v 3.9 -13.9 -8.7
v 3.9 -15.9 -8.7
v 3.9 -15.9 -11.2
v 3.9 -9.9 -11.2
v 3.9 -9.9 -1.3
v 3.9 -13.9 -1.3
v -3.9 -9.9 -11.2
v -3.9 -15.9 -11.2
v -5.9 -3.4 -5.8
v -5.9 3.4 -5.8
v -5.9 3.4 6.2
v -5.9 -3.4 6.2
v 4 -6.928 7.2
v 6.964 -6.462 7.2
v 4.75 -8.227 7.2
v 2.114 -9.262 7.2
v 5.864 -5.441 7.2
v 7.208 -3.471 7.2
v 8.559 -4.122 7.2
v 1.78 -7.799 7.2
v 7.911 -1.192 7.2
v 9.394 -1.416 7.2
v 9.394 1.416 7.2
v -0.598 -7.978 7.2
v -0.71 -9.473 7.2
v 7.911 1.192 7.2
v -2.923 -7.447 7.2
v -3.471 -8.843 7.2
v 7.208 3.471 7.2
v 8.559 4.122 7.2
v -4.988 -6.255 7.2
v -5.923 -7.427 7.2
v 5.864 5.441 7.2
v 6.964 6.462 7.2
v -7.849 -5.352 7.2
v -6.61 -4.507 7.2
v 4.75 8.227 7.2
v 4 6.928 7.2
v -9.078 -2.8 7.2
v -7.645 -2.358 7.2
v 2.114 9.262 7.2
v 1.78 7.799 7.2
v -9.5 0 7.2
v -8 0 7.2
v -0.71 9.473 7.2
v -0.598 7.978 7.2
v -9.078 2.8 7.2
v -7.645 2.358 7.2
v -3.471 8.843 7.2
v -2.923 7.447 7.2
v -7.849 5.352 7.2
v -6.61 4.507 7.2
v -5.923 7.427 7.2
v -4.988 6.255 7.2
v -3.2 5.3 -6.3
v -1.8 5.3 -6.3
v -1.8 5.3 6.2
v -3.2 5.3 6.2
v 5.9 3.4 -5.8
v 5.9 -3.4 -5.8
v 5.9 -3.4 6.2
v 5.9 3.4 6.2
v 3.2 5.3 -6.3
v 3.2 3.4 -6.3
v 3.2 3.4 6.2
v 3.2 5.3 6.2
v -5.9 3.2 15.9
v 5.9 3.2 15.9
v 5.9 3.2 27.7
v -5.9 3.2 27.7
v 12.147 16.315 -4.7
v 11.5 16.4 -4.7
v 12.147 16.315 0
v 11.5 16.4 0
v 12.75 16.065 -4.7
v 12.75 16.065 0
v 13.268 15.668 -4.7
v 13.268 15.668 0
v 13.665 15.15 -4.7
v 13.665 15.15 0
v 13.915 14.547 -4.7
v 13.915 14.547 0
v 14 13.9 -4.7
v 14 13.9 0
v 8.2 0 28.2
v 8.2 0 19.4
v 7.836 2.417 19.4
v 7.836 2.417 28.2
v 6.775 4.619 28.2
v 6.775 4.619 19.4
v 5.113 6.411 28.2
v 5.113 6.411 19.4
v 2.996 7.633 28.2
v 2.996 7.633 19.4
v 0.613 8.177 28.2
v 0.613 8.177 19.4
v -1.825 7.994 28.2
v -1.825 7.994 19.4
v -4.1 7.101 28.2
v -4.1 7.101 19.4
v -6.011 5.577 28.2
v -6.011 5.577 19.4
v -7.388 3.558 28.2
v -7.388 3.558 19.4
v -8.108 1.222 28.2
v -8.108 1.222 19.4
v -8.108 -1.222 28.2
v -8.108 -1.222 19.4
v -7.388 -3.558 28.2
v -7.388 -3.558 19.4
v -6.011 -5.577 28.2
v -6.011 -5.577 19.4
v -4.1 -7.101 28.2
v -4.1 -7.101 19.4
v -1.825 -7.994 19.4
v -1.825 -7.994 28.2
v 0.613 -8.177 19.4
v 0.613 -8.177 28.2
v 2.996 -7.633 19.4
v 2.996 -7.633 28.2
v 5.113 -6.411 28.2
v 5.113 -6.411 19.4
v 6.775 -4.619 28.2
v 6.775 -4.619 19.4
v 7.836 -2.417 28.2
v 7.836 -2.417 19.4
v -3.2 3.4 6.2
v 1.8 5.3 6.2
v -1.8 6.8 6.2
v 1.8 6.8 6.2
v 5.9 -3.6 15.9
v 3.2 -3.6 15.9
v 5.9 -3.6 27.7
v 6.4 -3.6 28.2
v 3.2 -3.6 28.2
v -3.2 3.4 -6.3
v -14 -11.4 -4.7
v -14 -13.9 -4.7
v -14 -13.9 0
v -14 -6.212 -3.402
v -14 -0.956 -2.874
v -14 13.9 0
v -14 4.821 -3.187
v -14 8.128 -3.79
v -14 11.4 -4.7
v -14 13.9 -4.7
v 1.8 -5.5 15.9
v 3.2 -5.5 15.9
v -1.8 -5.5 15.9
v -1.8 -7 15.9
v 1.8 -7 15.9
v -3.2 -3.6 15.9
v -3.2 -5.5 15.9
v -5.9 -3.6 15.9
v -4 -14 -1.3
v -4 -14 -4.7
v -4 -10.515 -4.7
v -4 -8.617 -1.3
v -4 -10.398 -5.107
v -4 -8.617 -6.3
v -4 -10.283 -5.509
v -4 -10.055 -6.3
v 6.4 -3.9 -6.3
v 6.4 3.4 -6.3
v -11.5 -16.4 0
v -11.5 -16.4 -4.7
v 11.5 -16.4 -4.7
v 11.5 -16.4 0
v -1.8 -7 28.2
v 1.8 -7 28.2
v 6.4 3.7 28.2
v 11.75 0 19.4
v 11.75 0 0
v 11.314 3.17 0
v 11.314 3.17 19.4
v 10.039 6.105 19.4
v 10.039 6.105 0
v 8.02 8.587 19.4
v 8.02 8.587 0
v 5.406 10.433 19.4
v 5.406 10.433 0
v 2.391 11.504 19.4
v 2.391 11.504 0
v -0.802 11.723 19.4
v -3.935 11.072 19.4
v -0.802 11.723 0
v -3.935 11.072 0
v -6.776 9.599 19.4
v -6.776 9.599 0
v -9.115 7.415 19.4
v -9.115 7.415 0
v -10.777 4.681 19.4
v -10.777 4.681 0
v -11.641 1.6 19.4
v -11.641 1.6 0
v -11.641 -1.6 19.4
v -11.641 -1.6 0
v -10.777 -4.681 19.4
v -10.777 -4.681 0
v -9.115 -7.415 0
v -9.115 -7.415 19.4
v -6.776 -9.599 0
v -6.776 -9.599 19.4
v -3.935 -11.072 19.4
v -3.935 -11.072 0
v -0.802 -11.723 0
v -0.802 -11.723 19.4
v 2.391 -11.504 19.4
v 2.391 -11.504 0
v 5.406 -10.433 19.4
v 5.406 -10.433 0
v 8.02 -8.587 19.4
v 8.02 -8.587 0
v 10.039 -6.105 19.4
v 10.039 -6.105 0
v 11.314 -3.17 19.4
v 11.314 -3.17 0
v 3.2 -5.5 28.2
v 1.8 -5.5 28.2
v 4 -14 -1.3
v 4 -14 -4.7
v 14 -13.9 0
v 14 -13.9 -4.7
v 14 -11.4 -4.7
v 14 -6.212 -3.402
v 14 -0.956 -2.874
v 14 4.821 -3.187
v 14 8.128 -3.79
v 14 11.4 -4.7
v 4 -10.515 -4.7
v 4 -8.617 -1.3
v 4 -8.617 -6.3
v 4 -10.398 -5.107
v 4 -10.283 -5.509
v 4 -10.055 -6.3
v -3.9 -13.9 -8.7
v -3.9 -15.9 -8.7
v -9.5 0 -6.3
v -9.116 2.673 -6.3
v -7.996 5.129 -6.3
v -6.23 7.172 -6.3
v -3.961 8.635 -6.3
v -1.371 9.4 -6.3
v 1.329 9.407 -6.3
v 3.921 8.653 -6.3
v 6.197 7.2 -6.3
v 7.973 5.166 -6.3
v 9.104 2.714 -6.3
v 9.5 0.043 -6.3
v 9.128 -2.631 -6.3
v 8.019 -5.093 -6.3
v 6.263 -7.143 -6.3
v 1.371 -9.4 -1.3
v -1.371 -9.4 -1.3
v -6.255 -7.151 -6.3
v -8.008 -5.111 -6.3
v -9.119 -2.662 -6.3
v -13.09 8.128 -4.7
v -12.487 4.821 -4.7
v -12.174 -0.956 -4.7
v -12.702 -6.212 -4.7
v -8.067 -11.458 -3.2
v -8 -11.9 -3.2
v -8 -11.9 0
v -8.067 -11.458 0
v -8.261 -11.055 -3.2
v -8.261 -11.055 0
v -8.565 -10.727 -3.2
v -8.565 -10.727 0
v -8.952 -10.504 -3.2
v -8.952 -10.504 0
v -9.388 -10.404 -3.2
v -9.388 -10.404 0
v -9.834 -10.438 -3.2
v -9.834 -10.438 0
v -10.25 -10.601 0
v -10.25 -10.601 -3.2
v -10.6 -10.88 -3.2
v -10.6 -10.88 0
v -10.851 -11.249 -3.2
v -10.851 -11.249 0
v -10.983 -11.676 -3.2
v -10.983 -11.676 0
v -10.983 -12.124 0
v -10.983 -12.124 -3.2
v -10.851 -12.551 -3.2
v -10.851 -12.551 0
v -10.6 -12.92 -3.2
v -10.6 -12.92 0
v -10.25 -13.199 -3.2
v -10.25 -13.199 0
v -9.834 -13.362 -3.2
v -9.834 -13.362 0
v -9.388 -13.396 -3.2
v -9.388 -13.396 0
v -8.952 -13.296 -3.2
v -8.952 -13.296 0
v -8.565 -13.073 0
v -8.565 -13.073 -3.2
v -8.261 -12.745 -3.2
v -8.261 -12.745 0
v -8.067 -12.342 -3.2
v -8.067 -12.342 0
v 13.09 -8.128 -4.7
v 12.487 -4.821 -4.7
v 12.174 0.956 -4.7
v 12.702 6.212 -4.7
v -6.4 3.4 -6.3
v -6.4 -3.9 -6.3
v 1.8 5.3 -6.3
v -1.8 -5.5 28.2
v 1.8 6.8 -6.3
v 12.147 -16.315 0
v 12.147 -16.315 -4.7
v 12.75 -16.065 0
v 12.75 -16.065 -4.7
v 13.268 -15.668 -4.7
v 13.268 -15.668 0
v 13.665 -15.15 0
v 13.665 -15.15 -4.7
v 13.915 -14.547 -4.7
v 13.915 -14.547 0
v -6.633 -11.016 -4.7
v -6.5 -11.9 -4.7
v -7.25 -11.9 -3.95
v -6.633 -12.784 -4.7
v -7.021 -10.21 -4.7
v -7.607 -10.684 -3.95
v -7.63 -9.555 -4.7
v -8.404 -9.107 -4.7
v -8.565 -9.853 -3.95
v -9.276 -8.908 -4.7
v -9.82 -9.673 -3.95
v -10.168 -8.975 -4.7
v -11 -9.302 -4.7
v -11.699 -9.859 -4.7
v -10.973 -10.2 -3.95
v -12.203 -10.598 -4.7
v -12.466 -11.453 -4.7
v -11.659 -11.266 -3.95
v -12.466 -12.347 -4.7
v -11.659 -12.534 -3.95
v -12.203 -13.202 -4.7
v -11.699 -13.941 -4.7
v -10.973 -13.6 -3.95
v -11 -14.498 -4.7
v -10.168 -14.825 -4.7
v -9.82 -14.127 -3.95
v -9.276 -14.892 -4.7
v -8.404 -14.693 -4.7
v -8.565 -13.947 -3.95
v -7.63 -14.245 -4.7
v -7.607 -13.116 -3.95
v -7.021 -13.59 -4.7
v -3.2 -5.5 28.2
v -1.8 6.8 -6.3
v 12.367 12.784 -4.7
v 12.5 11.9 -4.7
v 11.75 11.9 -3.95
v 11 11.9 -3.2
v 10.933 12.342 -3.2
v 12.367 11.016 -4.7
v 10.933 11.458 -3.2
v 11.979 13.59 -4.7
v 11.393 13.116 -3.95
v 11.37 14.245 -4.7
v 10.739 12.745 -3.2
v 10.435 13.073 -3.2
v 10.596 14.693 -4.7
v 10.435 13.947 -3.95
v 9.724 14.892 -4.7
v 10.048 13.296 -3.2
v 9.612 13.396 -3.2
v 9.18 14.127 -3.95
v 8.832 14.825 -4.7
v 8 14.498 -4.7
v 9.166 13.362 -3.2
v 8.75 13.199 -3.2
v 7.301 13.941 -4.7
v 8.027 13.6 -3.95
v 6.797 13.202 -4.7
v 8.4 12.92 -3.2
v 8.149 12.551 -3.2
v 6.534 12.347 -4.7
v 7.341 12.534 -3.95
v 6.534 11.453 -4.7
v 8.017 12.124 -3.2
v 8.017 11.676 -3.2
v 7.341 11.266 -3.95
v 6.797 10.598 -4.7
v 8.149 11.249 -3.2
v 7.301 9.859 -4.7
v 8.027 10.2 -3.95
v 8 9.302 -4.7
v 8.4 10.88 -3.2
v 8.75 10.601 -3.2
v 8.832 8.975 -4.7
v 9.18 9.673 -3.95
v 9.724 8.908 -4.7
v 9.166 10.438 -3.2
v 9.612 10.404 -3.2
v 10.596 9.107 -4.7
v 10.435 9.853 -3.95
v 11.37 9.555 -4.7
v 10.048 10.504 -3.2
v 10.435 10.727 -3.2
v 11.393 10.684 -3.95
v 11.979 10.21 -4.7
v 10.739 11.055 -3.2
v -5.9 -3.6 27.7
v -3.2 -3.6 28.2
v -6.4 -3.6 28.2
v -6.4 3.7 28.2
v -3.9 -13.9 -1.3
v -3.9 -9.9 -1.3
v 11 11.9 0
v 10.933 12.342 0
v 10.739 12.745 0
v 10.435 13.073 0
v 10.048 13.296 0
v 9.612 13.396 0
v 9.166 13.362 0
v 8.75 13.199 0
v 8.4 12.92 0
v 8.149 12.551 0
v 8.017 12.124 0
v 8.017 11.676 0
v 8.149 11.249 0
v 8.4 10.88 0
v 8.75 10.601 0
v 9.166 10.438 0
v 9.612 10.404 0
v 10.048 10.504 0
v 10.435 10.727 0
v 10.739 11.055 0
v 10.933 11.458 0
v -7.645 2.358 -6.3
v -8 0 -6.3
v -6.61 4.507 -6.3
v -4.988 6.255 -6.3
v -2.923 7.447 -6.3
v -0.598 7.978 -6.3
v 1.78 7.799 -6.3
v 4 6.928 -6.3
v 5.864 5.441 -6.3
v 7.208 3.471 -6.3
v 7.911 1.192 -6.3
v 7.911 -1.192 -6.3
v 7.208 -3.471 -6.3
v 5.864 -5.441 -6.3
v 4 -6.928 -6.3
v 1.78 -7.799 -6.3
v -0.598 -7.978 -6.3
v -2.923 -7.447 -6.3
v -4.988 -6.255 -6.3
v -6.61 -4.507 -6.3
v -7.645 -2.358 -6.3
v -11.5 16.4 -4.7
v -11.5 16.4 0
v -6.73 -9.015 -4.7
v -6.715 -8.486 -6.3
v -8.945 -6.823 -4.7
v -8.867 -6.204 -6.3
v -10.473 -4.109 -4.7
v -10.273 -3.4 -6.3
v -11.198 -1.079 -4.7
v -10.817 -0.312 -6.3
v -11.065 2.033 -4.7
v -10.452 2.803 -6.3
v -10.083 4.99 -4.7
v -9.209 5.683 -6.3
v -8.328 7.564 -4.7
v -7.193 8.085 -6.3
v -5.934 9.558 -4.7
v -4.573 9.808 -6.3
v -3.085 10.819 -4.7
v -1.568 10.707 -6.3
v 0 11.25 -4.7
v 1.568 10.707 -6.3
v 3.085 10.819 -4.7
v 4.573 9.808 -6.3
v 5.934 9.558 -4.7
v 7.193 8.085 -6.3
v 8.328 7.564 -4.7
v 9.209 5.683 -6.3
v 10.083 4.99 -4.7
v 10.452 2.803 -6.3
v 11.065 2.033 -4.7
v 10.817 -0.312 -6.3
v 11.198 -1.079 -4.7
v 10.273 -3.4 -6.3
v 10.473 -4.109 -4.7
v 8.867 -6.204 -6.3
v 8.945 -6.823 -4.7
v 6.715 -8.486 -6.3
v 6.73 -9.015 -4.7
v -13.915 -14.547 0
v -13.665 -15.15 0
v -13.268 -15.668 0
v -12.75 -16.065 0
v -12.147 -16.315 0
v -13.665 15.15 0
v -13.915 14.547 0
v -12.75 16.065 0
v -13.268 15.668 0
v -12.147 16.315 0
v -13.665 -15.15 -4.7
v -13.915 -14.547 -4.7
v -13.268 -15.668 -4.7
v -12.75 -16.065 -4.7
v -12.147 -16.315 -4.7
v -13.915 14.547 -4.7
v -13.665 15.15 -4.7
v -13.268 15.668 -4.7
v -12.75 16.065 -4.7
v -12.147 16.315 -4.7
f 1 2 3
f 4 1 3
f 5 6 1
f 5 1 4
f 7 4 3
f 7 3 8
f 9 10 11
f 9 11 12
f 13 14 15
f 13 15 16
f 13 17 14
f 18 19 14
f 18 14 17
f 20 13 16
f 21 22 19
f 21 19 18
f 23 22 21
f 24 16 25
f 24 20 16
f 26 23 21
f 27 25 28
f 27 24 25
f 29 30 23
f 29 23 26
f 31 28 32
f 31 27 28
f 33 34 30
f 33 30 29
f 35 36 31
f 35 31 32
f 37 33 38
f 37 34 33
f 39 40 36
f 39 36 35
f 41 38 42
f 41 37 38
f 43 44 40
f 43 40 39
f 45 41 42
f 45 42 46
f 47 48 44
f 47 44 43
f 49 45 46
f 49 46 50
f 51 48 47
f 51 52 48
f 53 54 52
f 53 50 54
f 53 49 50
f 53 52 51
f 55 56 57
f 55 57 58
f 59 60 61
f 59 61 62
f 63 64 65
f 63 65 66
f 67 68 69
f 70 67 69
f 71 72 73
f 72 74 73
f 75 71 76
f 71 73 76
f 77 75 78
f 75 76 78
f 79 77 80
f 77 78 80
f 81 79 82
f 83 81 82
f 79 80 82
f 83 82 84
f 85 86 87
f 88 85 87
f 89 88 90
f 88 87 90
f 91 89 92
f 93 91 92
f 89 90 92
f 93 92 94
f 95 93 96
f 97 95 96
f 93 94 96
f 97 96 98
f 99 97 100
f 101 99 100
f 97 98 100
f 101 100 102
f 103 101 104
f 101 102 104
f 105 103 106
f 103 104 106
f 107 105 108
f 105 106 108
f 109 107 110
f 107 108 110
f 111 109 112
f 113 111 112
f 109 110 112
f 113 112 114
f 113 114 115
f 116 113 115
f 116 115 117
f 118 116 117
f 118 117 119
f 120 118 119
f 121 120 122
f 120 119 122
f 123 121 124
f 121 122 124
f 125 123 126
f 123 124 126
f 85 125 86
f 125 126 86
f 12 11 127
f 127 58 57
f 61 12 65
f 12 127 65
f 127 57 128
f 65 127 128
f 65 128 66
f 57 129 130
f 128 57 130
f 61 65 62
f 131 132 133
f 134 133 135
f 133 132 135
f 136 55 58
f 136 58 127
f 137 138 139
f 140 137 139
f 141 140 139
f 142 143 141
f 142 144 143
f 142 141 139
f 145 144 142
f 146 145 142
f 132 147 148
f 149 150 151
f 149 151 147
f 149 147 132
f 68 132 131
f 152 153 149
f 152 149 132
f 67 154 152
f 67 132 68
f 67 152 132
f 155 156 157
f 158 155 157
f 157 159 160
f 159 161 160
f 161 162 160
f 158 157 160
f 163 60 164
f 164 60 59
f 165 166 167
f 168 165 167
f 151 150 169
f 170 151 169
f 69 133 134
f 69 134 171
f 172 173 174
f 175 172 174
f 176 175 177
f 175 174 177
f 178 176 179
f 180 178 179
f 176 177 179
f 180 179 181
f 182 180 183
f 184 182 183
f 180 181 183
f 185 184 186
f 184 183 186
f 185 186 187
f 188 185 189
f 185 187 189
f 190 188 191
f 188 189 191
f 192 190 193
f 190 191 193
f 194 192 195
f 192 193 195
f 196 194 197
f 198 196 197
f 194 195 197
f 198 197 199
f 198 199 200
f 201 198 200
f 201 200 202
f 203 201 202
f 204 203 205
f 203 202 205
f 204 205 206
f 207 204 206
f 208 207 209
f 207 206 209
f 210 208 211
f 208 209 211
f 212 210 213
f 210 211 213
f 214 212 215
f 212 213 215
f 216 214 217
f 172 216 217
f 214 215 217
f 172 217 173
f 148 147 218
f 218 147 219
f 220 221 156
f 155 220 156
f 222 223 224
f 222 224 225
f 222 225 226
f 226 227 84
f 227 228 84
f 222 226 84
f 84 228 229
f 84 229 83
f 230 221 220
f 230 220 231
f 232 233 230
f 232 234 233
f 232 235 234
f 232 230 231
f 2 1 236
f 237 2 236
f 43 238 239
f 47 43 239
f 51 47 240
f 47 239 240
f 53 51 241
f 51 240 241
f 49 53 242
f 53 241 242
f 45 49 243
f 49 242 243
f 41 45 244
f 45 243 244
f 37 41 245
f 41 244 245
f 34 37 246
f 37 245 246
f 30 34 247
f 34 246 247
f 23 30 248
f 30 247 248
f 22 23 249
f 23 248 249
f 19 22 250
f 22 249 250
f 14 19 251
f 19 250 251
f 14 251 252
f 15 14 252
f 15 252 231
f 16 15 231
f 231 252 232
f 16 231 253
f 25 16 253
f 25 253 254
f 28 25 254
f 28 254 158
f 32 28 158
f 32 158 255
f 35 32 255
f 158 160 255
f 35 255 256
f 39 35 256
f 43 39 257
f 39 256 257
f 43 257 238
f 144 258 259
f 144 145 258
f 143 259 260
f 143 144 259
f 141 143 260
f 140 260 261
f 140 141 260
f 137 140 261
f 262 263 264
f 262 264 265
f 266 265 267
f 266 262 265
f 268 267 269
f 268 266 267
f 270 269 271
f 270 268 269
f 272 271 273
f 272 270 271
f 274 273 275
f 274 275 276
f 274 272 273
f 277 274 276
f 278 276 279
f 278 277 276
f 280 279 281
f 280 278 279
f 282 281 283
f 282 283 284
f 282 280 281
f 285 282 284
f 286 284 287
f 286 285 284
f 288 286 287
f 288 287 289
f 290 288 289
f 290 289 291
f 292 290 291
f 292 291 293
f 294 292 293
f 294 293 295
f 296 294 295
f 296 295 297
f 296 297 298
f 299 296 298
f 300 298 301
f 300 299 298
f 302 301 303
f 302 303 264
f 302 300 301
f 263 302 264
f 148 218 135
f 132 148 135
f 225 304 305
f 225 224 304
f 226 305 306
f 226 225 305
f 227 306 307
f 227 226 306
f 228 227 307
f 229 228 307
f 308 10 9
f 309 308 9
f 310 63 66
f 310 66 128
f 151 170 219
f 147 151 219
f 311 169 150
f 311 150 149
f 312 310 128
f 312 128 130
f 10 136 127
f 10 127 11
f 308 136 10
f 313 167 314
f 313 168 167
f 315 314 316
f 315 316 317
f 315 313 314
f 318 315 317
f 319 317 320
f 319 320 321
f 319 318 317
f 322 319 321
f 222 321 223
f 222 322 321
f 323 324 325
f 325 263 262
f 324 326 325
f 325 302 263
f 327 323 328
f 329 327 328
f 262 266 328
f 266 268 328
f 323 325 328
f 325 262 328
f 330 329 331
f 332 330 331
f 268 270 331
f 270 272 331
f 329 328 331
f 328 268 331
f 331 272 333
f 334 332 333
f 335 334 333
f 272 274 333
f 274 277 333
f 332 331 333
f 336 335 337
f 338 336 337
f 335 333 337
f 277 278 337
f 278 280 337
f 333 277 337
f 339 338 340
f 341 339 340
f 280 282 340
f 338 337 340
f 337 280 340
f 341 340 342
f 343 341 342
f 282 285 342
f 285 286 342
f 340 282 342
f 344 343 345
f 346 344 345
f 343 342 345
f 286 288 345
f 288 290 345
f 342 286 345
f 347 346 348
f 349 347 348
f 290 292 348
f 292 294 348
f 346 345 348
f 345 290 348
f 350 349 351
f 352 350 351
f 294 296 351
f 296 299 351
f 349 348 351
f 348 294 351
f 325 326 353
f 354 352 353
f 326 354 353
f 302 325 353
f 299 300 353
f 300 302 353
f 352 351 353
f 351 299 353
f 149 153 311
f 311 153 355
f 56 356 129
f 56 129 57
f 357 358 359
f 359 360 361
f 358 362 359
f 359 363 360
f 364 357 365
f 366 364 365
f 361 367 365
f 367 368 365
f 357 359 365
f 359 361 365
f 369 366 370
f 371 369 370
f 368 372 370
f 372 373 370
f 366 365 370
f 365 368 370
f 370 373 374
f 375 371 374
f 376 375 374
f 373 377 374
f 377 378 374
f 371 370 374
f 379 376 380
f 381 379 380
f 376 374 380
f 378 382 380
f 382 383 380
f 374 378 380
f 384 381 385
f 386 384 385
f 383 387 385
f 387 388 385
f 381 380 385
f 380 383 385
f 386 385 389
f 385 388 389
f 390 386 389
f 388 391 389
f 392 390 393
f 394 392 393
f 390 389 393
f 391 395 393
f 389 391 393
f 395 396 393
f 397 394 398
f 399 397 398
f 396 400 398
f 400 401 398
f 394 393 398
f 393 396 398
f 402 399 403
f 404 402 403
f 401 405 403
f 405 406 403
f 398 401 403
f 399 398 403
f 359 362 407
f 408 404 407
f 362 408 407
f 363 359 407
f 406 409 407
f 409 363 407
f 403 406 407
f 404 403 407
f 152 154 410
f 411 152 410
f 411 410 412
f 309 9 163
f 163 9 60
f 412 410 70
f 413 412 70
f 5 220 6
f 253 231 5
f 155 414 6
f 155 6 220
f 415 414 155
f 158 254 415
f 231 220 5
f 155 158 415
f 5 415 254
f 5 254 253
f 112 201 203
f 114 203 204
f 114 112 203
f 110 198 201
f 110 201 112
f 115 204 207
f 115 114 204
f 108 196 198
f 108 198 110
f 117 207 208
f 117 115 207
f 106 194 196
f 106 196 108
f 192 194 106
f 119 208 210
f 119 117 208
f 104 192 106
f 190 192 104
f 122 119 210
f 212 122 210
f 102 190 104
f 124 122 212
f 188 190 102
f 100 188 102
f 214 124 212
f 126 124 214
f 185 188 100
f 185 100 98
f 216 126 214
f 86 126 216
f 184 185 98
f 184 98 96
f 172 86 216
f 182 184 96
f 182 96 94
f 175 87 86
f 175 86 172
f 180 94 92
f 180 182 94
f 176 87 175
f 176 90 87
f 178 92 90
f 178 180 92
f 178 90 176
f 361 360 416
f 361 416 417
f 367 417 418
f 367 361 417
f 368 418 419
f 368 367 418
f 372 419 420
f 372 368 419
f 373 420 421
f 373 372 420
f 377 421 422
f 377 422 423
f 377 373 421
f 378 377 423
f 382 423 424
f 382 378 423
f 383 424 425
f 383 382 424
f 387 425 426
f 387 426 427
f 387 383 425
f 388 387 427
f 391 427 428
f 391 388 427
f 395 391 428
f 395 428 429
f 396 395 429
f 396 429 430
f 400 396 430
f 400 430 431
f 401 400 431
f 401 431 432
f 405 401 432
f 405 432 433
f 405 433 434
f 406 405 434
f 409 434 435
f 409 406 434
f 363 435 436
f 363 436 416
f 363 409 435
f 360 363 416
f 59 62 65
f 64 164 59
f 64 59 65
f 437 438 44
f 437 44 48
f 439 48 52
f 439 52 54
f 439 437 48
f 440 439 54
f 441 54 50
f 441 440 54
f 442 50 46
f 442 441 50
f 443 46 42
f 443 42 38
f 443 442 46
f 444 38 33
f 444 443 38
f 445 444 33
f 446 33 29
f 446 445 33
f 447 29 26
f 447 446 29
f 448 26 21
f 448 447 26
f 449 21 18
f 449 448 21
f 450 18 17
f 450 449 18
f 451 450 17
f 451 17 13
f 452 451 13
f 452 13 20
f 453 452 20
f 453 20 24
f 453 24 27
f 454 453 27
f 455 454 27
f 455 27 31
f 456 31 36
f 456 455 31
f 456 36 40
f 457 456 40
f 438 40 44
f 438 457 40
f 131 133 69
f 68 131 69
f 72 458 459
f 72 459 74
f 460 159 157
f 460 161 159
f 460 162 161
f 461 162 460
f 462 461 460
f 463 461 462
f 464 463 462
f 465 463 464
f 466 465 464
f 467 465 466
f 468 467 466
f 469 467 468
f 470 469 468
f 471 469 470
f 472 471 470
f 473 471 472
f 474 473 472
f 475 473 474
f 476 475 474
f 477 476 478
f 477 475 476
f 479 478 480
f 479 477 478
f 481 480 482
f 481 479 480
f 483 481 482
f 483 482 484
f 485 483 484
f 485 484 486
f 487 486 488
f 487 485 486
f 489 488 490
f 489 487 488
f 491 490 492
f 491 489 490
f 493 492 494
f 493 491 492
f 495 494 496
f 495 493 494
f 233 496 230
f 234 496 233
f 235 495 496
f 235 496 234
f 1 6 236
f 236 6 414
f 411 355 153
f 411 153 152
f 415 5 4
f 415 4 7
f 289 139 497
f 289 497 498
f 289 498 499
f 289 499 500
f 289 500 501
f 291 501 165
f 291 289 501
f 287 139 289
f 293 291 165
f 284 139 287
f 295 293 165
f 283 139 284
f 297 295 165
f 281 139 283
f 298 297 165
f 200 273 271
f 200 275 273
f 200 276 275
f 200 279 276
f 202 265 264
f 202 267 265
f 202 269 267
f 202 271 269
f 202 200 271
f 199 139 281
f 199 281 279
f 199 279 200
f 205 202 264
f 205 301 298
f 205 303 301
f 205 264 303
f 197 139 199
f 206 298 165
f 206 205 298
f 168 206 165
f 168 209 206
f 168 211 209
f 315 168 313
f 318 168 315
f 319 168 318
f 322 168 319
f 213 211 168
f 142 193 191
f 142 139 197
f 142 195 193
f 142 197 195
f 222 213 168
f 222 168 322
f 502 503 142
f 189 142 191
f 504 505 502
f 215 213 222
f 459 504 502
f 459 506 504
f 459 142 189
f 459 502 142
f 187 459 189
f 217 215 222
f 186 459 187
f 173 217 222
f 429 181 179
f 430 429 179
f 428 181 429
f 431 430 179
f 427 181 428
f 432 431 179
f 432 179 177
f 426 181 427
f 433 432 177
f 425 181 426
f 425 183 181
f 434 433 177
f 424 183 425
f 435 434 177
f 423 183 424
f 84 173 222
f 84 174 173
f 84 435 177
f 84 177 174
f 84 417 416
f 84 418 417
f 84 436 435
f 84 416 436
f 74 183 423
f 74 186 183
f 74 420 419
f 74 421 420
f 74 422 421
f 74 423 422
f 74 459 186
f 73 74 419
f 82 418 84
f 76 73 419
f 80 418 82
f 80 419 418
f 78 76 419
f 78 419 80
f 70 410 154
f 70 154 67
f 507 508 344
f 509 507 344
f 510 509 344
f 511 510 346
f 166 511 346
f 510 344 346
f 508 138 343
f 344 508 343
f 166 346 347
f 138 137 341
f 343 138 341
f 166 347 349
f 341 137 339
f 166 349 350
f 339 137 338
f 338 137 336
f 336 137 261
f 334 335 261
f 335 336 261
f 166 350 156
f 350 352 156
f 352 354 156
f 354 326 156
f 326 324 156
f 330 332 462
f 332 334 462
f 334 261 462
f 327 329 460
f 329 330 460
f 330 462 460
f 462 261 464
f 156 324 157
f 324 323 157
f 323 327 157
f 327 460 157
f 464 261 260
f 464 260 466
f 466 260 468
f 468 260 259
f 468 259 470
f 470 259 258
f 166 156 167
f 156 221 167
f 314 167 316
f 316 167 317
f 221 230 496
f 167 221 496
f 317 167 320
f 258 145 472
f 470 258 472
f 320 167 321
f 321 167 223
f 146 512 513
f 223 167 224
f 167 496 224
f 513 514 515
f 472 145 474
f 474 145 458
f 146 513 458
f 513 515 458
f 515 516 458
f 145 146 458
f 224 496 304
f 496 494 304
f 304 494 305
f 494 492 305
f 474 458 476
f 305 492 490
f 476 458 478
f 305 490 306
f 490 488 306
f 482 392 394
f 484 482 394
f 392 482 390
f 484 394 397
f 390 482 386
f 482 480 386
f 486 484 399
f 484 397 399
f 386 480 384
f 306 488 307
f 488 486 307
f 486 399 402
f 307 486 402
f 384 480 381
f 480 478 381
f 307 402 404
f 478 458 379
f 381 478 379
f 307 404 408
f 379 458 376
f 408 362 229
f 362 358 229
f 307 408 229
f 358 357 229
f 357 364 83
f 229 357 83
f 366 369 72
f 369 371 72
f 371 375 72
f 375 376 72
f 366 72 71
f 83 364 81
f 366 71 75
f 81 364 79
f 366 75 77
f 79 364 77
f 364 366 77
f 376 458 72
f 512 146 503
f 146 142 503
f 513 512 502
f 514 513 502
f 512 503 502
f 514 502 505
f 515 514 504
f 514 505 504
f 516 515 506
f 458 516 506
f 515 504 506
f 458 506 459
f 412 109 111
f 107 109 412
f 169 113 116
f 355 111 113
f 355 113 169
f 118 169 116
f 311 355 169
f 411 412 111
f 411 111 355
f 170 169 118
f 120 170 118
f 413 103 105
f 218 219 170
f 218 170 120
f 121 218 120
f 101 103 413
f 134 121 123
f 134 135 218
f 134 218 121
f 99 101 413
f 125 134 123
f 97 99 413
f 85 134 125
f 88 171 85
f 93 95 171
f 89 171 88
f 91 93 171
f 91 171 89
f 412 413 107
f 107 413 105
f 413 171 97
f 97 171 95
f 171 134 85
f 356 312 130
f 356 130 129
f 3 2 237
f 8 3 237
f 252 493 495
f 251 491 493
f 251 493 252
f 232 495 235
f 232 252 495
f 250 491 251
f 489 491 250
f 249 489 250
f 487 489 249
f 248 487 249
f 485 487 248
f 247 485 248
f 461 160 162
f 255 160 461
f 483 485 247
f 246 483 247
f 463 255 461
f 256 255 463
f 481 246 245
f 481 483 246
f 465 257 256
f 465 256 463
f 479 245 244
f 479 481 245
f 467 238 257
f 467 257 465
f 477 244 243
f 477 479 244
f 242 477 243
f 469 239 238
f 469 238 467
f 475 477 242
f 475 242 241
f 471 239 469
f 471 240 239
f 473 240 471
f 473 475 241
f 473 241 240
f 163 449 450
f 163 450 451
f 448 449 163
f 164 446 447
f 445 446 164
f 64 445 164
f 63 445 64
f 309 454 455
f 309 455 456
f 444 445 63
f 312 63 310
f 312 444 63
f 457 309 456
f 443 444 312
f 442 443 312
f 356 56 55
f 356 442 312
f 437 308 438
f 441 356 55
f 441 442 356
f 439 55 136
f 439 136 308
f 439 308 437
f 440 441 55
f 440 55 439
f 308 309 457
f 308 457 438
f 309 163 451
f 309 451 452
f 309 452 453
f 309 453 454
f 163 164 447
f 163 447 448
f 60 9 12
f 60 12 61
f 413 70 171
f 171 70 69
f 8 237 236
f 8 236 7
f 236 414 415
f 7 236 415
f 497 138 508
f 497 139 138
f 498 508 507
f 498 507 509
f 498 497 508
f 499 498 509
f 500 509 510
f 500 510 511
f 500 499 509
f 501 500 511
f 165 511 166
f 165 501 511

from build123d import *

# Parameters (mm, degrees)
ESQUISSE1_R                   = 11.75
BOSS_EXTRU_1_DEPTH            = 19.4
ESQUISSE2_R                   = 8.2
BOSS_EXTRU_2_DEPTH            = 8.8
ENL_V_START                   = -5.9
ENL_V_MAT_EXTRU_1_OUTLINE_W   = 6.8
ENL_V_MAT_EXTRU_1_OUTLINE_H   = 12.3
ENL_V_MAT_EXTRU_1_DEPTH       = 11.8
ENL_V_START_2                 = -1.8
ENL_V_MAT_EXTRU_1_2_OUTLINE_W = 3.4
ENL_V_MAT_EXTRU_1_2_OUTLINE_H = 12.3
ENL_V_MAT_EXTRU_1_2_DEPTH     = 3.6
ENL_V_START_3                 = -3.2
ENL_V_MAT_EXTRU_1_3_OUTLINE_W = 1.9
ENL_V_MAT_EXTRU_1_3_OUTLINE_H = 12.3
ENL_V_MAT_EXTRU_1_3_DEPTH     = 6.4
BOSS_EXTRU_3_START            = -4.7
BOSS_EXTRU_3_OUTLINE_W        = 28
BOSS_EXTRU_3_OUTLINE_H        = 32.8
BOSS_EXTRU_3_OUTLINE_R        = 1.5
BOSS_EXTRU_3_DEPTH            = 4.7
ESQUISSE5_R                   = 11.25
BOSS_EXTRU_4_DEPTH            = 1.6
BOSS_EXTRU_4_TAPER            = 15
ESQUISSE6_R                   = 9.5
ESQUISSE6_R_2                 = 8
ENL_V_MAT_EXTRU_2_DEPTH       = 13.5
ENL_V_MAT_EXTRU_3_DEPTH       = 12.5
CHANFREIN1_SIZE               = 1.5
CONG_1_R                      = 2.5
ENL_V_MAT_EXTRU_4_DEPTH       = 2.5
ENL_V_MAT_EXTRU_4_DEPTH_BACK  = 35.225502188
ENL_V_MAT_EXTRU_5_DEPTH       = 2.5
ENL_V_MAT_EXTRU_5_DEPTH_BACK  = 35.225502188
ESQUISSE10_W                  = 8
ESQUISSE10_H                  = 5.5
ENL_V_MAT_EXTRU_6_DEPTH       = 5
ESQUISSE11_W                  = 7.8
ESQUISSE11_H                  = 4
BOSS_EXTRU_5_DEPTH            = 7.4
ESQUISSE12_W                  = 7.8
ESQUISSE12_H                  = 6
BOSS_EXTRU_6_DEPTH            = 2.5
CHANFREIN2_SIZE               = 0.5


# Read off the part's stored shape, not the designer's step: Enlèv. mat.-Extru.1, Boss.-Extru.3
with BuildPart() as part:
    # Esquisse1 → Boss.-Extru.1 (new body)
    with BuildSketch(Plane.XY):
        Circle(ESQUISSE1_R)
    extrude(amount=BOSS_EXTRU_1_DEPTH)

    # Esquisse2 → Boss.-Extru.2 (add)
    with BuildSketch(Plane.XY.offset(19.4)):
        Circle(ESQUISSE2_R)
    extrude(amount=BOSS_EXTRU_2_DEPTH)

    # Enlèv. mat.-Extru.1 outline → Enlèv. mat.-Extru.1 (cut)
    with BuildSketch(Plane.YZ.offset(ENL_V_START)):
        with Locations((-0.2, 22.05)):
            Rectangle(ENL_V_MAT_EXTRU_1_OUTLINE_W, ENL_V_MAT_EXTRU_1_OUTLINE_H)
    extrude(amount=ENL_V_MAT_EXTRU_1_DEPTH, mode=Mode.SUBTRACT)

    # Enl_v. mat.-Extru.1 2 outline → Enl_v. mat.-Extru.1 2 (cut)
    with BuildSketch(Plane.YZ.offset(ENL_V_START_2)):
        with Locations((-5.3, 22.05)):
            Rectangle(ENL_V_MAT_EXTRU_1_2_OUTLINE_W, ENL_V_MAT_EXTRU_1_2_OUTLINE_H)
    extrude(amount=ENL_V_MAT_EXTRU_1_2_DEPTH, mode=Mode.SUBTRACT)

    # Enl_v. mat.-Extru.1 3 outline → Enl_v. mat.-Extru.1 3 (cut)
    with BuildSketch(Plane.YZ.offset(ENL_V_START_3)):
        with Locations((-4.55, 22.05)):
            Rectangle(ENL_V_MAT_EXTRU_1_3_OUTLINE_W, ENL_V_MAT_EXTRU_1_3_OUTLINE_H)
    extrude(amount=ENL_V_MAT_EXTRU_1_3_DEPTH, mode=Mode.SUBTRACT)

    # Boss.-Extru.3 outline → Boss.-Extru.3 (add)
    with BuildSketch(Plane.XY.offset(BOSS_EXTRU_3_START)):
        Rectangle(BOSS_EXTRU_3_OUTLINE_W, BOSS_EXTRU_3_OUTLINE_H)
        with Locations((-9.5, -11.9)):
            Circle(BOSS_EXTRU_3_OUTLINE_R, mode=Mode.SUBTRACT)
        with Locations((9.5, 11.9)):
            Circle(BOSS_EXTRU_3_OUTLINE_R, mode=Mode.SUBTRACT)
    extrude(amount=BOSS_EXTRU_3_DEPTH)

    # Esquisse5 → Boss.-Extru.4 (add)
    with BuildSketch(Plane(origin=(0, 0, -4.7), x_dir=(-1, 0, 0), z_dir=(0, 0, -1))):
        Circle(ESQUISSE5_R)
    extrude(amount=BOSS_EXTRU_4_DEPTH, taper=BOSS_EXTRU_4_TAPER)

    # Esquisse6 → Enlèv. mat.-Extru.2 (cut)
    with BuildSketch(Plane(origin=(0, 0, -6.3), x_dir=(-1, 0, 0), z_dir=(0, 0, -1))):
        Circle(ESQUISSE6_R)
        Circle(ESQUISSE6_R_2, mode=Mode.SUBTRACT)
    extrude(amount=-ENL_V_MAT_EXTRU_2_DEPTH, mode=Mode.SUBTRACT)

    # Esquisse7 → Enlèv. mat.-Extru.3 (cut)
    with BuildSketch(Plane(origin=(0, 0, -6.3), x_dir=(-1, 0, 0), z_dir=(0, 0, -1))):
        Polygon((-3.2, 3.4), (-3.2, 5.3), (-1.8, 5.3), (-1.8, 6.8), (1.8, 6.8), (1.8, 5.3), (3.2, 5.3), (3.2, 3.4), (5.9, 3.4), (5.9, -3.4), (-5.9, -3.4), (-5.9, 3.4), align=None)
    extrude(amount=-ENL_V_MAT_EXTRU_3_DEPTH, mode=Mode.SUBTRACT)

    # Chanfrein1
    chanfrein1_edges = [part.edges().sort_by_distance(p)[0] for p in [
        (8, 11.9, -4.7),
        (-11, -11.9, -4.7),
    ]]
    chamfer(chanfrein1_edges, length=CHANFREIN1_SIZE)

    # Congé1
    cong_1_edges = [part.edges().sort_by_distance(p)[0] for p in [
        (14, 16.4, -2.35),
        (14, -16.4, -2.35),
        (-14, -16.4, -2.35),
        (-14, 16.4, -2.35),
    ]]
    fillet(cong_1_edges, radius=CONG_1_R)

    # Esquisse8 → Enlèv. mat.-Extru.4 (cut, two sides: drawn at the far end of the back side and taken through both)
    with BuildSketch(Plane(origin=(-4.65, 0, 4.65), x_dir=(0, 1, 0), z_dir=(0.7071067811865464, 0, -0.7071067811865488)).offset(-ENL_V_MAT_EXTRU_4_DEPTH_BACK)):
        with BuildLine():
            Line((-11.4, -13.222896808), (11.4, -13.222896808))
            ThreePointArc((11.4, -13.222896808), (0, -11.922896808), (-11.4, -13.222896808))
        make_face()
    extrude(amount=ENL_V_MAT_EXTRU_4_DEPTH + ENL_V_MAT_EXTRU_4_DEPTH_BACK, mode=Mode.SUBTRACT)

    # Esquisse9 → Enlèv. mat.-Extru.5 (cut, two sides: drawn at the far end of the back side and taken through both)
    with BuildSketch(Plane(origin=(4.65, 0, 4.65), x_dir=(0, -1, 0), z_dir=(-0.7071067811865464, 0, -0.7071067811865488)).offset(-ENL_V_MAT_EXTRU_5_DEPTH_BACK)):
        with BuildLine():
            Line((-11.4, -13.222896808), (11.4, -13.222896808))
            ThreePointArc((11.4, -13.222896808), (0, -11.922896808), (-11.4, -13.222896808))
        make_face()
    extrude(amount=ENL_V_MAT_EXTRU_5_DEPTH + ENL_V_MAT_EXTRU_5_DEPTH_BACK, mode=Mode.SUBTRACT)

    # Esquisse10 → Enlèv. mat.-Extru.6 (cut)
    with BuildSketch(Plane(origin=(0, 0, -6.3), x_dir=(-1, 0, 0), z_dir=(0, 0, -1))):
        with Locations((0, -11.25)):
            Rectangle(ESQUISSE10_W, ESQUISSE10_H)
    extrude(amount=-ENL_V_MAT_EXTRU_6_DEPTH, mode=Mode.SUBTRACT)

    # Esquisse11 → Boss.-Extru.5 (add)
    with BuildSketch(Plane(origin=(0, 0, -1.3), x_dir=(-1, 0, 0), z_dir=(0, 0, -1))):
        with Locations((0, -11.9)):
            Rectangle(ESQUISSE11_W, ESQUISSE11_H)
    extrude(amount=BOSS_EXTRU_5_DEPTH)

    # Esquisse12 → Boss.-Extru.6 (add)
    with BuildSketch(Plane(origin=(0, 0, -8.7), x_dir=(-1, 0, 0), z_dir=(0, 0, -1))):
        with Locations((0, -12.9)):
            Rectangle(ESQUISSE12_W, ESQUISSE12_H)
    extrude(amount=BOSS_EXTRU_6_DEPTH)

    # Chanfrein2
    chanfrein2_edges = [part.edges().sort_by_distance(p)[0] for p in [
        (5.9, -0.2, 28.2),
        (0, 3.2, 28.2),
        (-5.9, -0.2, 28.2),
        (5.9, 0, -6.3),
        (0, -3.4, -6.3),
        (-5.9, 0, -6.3),
    ]]
    chamfer(chanfrein2_edges, length=CHANFREIN2_SIZE)


solid = part.part
